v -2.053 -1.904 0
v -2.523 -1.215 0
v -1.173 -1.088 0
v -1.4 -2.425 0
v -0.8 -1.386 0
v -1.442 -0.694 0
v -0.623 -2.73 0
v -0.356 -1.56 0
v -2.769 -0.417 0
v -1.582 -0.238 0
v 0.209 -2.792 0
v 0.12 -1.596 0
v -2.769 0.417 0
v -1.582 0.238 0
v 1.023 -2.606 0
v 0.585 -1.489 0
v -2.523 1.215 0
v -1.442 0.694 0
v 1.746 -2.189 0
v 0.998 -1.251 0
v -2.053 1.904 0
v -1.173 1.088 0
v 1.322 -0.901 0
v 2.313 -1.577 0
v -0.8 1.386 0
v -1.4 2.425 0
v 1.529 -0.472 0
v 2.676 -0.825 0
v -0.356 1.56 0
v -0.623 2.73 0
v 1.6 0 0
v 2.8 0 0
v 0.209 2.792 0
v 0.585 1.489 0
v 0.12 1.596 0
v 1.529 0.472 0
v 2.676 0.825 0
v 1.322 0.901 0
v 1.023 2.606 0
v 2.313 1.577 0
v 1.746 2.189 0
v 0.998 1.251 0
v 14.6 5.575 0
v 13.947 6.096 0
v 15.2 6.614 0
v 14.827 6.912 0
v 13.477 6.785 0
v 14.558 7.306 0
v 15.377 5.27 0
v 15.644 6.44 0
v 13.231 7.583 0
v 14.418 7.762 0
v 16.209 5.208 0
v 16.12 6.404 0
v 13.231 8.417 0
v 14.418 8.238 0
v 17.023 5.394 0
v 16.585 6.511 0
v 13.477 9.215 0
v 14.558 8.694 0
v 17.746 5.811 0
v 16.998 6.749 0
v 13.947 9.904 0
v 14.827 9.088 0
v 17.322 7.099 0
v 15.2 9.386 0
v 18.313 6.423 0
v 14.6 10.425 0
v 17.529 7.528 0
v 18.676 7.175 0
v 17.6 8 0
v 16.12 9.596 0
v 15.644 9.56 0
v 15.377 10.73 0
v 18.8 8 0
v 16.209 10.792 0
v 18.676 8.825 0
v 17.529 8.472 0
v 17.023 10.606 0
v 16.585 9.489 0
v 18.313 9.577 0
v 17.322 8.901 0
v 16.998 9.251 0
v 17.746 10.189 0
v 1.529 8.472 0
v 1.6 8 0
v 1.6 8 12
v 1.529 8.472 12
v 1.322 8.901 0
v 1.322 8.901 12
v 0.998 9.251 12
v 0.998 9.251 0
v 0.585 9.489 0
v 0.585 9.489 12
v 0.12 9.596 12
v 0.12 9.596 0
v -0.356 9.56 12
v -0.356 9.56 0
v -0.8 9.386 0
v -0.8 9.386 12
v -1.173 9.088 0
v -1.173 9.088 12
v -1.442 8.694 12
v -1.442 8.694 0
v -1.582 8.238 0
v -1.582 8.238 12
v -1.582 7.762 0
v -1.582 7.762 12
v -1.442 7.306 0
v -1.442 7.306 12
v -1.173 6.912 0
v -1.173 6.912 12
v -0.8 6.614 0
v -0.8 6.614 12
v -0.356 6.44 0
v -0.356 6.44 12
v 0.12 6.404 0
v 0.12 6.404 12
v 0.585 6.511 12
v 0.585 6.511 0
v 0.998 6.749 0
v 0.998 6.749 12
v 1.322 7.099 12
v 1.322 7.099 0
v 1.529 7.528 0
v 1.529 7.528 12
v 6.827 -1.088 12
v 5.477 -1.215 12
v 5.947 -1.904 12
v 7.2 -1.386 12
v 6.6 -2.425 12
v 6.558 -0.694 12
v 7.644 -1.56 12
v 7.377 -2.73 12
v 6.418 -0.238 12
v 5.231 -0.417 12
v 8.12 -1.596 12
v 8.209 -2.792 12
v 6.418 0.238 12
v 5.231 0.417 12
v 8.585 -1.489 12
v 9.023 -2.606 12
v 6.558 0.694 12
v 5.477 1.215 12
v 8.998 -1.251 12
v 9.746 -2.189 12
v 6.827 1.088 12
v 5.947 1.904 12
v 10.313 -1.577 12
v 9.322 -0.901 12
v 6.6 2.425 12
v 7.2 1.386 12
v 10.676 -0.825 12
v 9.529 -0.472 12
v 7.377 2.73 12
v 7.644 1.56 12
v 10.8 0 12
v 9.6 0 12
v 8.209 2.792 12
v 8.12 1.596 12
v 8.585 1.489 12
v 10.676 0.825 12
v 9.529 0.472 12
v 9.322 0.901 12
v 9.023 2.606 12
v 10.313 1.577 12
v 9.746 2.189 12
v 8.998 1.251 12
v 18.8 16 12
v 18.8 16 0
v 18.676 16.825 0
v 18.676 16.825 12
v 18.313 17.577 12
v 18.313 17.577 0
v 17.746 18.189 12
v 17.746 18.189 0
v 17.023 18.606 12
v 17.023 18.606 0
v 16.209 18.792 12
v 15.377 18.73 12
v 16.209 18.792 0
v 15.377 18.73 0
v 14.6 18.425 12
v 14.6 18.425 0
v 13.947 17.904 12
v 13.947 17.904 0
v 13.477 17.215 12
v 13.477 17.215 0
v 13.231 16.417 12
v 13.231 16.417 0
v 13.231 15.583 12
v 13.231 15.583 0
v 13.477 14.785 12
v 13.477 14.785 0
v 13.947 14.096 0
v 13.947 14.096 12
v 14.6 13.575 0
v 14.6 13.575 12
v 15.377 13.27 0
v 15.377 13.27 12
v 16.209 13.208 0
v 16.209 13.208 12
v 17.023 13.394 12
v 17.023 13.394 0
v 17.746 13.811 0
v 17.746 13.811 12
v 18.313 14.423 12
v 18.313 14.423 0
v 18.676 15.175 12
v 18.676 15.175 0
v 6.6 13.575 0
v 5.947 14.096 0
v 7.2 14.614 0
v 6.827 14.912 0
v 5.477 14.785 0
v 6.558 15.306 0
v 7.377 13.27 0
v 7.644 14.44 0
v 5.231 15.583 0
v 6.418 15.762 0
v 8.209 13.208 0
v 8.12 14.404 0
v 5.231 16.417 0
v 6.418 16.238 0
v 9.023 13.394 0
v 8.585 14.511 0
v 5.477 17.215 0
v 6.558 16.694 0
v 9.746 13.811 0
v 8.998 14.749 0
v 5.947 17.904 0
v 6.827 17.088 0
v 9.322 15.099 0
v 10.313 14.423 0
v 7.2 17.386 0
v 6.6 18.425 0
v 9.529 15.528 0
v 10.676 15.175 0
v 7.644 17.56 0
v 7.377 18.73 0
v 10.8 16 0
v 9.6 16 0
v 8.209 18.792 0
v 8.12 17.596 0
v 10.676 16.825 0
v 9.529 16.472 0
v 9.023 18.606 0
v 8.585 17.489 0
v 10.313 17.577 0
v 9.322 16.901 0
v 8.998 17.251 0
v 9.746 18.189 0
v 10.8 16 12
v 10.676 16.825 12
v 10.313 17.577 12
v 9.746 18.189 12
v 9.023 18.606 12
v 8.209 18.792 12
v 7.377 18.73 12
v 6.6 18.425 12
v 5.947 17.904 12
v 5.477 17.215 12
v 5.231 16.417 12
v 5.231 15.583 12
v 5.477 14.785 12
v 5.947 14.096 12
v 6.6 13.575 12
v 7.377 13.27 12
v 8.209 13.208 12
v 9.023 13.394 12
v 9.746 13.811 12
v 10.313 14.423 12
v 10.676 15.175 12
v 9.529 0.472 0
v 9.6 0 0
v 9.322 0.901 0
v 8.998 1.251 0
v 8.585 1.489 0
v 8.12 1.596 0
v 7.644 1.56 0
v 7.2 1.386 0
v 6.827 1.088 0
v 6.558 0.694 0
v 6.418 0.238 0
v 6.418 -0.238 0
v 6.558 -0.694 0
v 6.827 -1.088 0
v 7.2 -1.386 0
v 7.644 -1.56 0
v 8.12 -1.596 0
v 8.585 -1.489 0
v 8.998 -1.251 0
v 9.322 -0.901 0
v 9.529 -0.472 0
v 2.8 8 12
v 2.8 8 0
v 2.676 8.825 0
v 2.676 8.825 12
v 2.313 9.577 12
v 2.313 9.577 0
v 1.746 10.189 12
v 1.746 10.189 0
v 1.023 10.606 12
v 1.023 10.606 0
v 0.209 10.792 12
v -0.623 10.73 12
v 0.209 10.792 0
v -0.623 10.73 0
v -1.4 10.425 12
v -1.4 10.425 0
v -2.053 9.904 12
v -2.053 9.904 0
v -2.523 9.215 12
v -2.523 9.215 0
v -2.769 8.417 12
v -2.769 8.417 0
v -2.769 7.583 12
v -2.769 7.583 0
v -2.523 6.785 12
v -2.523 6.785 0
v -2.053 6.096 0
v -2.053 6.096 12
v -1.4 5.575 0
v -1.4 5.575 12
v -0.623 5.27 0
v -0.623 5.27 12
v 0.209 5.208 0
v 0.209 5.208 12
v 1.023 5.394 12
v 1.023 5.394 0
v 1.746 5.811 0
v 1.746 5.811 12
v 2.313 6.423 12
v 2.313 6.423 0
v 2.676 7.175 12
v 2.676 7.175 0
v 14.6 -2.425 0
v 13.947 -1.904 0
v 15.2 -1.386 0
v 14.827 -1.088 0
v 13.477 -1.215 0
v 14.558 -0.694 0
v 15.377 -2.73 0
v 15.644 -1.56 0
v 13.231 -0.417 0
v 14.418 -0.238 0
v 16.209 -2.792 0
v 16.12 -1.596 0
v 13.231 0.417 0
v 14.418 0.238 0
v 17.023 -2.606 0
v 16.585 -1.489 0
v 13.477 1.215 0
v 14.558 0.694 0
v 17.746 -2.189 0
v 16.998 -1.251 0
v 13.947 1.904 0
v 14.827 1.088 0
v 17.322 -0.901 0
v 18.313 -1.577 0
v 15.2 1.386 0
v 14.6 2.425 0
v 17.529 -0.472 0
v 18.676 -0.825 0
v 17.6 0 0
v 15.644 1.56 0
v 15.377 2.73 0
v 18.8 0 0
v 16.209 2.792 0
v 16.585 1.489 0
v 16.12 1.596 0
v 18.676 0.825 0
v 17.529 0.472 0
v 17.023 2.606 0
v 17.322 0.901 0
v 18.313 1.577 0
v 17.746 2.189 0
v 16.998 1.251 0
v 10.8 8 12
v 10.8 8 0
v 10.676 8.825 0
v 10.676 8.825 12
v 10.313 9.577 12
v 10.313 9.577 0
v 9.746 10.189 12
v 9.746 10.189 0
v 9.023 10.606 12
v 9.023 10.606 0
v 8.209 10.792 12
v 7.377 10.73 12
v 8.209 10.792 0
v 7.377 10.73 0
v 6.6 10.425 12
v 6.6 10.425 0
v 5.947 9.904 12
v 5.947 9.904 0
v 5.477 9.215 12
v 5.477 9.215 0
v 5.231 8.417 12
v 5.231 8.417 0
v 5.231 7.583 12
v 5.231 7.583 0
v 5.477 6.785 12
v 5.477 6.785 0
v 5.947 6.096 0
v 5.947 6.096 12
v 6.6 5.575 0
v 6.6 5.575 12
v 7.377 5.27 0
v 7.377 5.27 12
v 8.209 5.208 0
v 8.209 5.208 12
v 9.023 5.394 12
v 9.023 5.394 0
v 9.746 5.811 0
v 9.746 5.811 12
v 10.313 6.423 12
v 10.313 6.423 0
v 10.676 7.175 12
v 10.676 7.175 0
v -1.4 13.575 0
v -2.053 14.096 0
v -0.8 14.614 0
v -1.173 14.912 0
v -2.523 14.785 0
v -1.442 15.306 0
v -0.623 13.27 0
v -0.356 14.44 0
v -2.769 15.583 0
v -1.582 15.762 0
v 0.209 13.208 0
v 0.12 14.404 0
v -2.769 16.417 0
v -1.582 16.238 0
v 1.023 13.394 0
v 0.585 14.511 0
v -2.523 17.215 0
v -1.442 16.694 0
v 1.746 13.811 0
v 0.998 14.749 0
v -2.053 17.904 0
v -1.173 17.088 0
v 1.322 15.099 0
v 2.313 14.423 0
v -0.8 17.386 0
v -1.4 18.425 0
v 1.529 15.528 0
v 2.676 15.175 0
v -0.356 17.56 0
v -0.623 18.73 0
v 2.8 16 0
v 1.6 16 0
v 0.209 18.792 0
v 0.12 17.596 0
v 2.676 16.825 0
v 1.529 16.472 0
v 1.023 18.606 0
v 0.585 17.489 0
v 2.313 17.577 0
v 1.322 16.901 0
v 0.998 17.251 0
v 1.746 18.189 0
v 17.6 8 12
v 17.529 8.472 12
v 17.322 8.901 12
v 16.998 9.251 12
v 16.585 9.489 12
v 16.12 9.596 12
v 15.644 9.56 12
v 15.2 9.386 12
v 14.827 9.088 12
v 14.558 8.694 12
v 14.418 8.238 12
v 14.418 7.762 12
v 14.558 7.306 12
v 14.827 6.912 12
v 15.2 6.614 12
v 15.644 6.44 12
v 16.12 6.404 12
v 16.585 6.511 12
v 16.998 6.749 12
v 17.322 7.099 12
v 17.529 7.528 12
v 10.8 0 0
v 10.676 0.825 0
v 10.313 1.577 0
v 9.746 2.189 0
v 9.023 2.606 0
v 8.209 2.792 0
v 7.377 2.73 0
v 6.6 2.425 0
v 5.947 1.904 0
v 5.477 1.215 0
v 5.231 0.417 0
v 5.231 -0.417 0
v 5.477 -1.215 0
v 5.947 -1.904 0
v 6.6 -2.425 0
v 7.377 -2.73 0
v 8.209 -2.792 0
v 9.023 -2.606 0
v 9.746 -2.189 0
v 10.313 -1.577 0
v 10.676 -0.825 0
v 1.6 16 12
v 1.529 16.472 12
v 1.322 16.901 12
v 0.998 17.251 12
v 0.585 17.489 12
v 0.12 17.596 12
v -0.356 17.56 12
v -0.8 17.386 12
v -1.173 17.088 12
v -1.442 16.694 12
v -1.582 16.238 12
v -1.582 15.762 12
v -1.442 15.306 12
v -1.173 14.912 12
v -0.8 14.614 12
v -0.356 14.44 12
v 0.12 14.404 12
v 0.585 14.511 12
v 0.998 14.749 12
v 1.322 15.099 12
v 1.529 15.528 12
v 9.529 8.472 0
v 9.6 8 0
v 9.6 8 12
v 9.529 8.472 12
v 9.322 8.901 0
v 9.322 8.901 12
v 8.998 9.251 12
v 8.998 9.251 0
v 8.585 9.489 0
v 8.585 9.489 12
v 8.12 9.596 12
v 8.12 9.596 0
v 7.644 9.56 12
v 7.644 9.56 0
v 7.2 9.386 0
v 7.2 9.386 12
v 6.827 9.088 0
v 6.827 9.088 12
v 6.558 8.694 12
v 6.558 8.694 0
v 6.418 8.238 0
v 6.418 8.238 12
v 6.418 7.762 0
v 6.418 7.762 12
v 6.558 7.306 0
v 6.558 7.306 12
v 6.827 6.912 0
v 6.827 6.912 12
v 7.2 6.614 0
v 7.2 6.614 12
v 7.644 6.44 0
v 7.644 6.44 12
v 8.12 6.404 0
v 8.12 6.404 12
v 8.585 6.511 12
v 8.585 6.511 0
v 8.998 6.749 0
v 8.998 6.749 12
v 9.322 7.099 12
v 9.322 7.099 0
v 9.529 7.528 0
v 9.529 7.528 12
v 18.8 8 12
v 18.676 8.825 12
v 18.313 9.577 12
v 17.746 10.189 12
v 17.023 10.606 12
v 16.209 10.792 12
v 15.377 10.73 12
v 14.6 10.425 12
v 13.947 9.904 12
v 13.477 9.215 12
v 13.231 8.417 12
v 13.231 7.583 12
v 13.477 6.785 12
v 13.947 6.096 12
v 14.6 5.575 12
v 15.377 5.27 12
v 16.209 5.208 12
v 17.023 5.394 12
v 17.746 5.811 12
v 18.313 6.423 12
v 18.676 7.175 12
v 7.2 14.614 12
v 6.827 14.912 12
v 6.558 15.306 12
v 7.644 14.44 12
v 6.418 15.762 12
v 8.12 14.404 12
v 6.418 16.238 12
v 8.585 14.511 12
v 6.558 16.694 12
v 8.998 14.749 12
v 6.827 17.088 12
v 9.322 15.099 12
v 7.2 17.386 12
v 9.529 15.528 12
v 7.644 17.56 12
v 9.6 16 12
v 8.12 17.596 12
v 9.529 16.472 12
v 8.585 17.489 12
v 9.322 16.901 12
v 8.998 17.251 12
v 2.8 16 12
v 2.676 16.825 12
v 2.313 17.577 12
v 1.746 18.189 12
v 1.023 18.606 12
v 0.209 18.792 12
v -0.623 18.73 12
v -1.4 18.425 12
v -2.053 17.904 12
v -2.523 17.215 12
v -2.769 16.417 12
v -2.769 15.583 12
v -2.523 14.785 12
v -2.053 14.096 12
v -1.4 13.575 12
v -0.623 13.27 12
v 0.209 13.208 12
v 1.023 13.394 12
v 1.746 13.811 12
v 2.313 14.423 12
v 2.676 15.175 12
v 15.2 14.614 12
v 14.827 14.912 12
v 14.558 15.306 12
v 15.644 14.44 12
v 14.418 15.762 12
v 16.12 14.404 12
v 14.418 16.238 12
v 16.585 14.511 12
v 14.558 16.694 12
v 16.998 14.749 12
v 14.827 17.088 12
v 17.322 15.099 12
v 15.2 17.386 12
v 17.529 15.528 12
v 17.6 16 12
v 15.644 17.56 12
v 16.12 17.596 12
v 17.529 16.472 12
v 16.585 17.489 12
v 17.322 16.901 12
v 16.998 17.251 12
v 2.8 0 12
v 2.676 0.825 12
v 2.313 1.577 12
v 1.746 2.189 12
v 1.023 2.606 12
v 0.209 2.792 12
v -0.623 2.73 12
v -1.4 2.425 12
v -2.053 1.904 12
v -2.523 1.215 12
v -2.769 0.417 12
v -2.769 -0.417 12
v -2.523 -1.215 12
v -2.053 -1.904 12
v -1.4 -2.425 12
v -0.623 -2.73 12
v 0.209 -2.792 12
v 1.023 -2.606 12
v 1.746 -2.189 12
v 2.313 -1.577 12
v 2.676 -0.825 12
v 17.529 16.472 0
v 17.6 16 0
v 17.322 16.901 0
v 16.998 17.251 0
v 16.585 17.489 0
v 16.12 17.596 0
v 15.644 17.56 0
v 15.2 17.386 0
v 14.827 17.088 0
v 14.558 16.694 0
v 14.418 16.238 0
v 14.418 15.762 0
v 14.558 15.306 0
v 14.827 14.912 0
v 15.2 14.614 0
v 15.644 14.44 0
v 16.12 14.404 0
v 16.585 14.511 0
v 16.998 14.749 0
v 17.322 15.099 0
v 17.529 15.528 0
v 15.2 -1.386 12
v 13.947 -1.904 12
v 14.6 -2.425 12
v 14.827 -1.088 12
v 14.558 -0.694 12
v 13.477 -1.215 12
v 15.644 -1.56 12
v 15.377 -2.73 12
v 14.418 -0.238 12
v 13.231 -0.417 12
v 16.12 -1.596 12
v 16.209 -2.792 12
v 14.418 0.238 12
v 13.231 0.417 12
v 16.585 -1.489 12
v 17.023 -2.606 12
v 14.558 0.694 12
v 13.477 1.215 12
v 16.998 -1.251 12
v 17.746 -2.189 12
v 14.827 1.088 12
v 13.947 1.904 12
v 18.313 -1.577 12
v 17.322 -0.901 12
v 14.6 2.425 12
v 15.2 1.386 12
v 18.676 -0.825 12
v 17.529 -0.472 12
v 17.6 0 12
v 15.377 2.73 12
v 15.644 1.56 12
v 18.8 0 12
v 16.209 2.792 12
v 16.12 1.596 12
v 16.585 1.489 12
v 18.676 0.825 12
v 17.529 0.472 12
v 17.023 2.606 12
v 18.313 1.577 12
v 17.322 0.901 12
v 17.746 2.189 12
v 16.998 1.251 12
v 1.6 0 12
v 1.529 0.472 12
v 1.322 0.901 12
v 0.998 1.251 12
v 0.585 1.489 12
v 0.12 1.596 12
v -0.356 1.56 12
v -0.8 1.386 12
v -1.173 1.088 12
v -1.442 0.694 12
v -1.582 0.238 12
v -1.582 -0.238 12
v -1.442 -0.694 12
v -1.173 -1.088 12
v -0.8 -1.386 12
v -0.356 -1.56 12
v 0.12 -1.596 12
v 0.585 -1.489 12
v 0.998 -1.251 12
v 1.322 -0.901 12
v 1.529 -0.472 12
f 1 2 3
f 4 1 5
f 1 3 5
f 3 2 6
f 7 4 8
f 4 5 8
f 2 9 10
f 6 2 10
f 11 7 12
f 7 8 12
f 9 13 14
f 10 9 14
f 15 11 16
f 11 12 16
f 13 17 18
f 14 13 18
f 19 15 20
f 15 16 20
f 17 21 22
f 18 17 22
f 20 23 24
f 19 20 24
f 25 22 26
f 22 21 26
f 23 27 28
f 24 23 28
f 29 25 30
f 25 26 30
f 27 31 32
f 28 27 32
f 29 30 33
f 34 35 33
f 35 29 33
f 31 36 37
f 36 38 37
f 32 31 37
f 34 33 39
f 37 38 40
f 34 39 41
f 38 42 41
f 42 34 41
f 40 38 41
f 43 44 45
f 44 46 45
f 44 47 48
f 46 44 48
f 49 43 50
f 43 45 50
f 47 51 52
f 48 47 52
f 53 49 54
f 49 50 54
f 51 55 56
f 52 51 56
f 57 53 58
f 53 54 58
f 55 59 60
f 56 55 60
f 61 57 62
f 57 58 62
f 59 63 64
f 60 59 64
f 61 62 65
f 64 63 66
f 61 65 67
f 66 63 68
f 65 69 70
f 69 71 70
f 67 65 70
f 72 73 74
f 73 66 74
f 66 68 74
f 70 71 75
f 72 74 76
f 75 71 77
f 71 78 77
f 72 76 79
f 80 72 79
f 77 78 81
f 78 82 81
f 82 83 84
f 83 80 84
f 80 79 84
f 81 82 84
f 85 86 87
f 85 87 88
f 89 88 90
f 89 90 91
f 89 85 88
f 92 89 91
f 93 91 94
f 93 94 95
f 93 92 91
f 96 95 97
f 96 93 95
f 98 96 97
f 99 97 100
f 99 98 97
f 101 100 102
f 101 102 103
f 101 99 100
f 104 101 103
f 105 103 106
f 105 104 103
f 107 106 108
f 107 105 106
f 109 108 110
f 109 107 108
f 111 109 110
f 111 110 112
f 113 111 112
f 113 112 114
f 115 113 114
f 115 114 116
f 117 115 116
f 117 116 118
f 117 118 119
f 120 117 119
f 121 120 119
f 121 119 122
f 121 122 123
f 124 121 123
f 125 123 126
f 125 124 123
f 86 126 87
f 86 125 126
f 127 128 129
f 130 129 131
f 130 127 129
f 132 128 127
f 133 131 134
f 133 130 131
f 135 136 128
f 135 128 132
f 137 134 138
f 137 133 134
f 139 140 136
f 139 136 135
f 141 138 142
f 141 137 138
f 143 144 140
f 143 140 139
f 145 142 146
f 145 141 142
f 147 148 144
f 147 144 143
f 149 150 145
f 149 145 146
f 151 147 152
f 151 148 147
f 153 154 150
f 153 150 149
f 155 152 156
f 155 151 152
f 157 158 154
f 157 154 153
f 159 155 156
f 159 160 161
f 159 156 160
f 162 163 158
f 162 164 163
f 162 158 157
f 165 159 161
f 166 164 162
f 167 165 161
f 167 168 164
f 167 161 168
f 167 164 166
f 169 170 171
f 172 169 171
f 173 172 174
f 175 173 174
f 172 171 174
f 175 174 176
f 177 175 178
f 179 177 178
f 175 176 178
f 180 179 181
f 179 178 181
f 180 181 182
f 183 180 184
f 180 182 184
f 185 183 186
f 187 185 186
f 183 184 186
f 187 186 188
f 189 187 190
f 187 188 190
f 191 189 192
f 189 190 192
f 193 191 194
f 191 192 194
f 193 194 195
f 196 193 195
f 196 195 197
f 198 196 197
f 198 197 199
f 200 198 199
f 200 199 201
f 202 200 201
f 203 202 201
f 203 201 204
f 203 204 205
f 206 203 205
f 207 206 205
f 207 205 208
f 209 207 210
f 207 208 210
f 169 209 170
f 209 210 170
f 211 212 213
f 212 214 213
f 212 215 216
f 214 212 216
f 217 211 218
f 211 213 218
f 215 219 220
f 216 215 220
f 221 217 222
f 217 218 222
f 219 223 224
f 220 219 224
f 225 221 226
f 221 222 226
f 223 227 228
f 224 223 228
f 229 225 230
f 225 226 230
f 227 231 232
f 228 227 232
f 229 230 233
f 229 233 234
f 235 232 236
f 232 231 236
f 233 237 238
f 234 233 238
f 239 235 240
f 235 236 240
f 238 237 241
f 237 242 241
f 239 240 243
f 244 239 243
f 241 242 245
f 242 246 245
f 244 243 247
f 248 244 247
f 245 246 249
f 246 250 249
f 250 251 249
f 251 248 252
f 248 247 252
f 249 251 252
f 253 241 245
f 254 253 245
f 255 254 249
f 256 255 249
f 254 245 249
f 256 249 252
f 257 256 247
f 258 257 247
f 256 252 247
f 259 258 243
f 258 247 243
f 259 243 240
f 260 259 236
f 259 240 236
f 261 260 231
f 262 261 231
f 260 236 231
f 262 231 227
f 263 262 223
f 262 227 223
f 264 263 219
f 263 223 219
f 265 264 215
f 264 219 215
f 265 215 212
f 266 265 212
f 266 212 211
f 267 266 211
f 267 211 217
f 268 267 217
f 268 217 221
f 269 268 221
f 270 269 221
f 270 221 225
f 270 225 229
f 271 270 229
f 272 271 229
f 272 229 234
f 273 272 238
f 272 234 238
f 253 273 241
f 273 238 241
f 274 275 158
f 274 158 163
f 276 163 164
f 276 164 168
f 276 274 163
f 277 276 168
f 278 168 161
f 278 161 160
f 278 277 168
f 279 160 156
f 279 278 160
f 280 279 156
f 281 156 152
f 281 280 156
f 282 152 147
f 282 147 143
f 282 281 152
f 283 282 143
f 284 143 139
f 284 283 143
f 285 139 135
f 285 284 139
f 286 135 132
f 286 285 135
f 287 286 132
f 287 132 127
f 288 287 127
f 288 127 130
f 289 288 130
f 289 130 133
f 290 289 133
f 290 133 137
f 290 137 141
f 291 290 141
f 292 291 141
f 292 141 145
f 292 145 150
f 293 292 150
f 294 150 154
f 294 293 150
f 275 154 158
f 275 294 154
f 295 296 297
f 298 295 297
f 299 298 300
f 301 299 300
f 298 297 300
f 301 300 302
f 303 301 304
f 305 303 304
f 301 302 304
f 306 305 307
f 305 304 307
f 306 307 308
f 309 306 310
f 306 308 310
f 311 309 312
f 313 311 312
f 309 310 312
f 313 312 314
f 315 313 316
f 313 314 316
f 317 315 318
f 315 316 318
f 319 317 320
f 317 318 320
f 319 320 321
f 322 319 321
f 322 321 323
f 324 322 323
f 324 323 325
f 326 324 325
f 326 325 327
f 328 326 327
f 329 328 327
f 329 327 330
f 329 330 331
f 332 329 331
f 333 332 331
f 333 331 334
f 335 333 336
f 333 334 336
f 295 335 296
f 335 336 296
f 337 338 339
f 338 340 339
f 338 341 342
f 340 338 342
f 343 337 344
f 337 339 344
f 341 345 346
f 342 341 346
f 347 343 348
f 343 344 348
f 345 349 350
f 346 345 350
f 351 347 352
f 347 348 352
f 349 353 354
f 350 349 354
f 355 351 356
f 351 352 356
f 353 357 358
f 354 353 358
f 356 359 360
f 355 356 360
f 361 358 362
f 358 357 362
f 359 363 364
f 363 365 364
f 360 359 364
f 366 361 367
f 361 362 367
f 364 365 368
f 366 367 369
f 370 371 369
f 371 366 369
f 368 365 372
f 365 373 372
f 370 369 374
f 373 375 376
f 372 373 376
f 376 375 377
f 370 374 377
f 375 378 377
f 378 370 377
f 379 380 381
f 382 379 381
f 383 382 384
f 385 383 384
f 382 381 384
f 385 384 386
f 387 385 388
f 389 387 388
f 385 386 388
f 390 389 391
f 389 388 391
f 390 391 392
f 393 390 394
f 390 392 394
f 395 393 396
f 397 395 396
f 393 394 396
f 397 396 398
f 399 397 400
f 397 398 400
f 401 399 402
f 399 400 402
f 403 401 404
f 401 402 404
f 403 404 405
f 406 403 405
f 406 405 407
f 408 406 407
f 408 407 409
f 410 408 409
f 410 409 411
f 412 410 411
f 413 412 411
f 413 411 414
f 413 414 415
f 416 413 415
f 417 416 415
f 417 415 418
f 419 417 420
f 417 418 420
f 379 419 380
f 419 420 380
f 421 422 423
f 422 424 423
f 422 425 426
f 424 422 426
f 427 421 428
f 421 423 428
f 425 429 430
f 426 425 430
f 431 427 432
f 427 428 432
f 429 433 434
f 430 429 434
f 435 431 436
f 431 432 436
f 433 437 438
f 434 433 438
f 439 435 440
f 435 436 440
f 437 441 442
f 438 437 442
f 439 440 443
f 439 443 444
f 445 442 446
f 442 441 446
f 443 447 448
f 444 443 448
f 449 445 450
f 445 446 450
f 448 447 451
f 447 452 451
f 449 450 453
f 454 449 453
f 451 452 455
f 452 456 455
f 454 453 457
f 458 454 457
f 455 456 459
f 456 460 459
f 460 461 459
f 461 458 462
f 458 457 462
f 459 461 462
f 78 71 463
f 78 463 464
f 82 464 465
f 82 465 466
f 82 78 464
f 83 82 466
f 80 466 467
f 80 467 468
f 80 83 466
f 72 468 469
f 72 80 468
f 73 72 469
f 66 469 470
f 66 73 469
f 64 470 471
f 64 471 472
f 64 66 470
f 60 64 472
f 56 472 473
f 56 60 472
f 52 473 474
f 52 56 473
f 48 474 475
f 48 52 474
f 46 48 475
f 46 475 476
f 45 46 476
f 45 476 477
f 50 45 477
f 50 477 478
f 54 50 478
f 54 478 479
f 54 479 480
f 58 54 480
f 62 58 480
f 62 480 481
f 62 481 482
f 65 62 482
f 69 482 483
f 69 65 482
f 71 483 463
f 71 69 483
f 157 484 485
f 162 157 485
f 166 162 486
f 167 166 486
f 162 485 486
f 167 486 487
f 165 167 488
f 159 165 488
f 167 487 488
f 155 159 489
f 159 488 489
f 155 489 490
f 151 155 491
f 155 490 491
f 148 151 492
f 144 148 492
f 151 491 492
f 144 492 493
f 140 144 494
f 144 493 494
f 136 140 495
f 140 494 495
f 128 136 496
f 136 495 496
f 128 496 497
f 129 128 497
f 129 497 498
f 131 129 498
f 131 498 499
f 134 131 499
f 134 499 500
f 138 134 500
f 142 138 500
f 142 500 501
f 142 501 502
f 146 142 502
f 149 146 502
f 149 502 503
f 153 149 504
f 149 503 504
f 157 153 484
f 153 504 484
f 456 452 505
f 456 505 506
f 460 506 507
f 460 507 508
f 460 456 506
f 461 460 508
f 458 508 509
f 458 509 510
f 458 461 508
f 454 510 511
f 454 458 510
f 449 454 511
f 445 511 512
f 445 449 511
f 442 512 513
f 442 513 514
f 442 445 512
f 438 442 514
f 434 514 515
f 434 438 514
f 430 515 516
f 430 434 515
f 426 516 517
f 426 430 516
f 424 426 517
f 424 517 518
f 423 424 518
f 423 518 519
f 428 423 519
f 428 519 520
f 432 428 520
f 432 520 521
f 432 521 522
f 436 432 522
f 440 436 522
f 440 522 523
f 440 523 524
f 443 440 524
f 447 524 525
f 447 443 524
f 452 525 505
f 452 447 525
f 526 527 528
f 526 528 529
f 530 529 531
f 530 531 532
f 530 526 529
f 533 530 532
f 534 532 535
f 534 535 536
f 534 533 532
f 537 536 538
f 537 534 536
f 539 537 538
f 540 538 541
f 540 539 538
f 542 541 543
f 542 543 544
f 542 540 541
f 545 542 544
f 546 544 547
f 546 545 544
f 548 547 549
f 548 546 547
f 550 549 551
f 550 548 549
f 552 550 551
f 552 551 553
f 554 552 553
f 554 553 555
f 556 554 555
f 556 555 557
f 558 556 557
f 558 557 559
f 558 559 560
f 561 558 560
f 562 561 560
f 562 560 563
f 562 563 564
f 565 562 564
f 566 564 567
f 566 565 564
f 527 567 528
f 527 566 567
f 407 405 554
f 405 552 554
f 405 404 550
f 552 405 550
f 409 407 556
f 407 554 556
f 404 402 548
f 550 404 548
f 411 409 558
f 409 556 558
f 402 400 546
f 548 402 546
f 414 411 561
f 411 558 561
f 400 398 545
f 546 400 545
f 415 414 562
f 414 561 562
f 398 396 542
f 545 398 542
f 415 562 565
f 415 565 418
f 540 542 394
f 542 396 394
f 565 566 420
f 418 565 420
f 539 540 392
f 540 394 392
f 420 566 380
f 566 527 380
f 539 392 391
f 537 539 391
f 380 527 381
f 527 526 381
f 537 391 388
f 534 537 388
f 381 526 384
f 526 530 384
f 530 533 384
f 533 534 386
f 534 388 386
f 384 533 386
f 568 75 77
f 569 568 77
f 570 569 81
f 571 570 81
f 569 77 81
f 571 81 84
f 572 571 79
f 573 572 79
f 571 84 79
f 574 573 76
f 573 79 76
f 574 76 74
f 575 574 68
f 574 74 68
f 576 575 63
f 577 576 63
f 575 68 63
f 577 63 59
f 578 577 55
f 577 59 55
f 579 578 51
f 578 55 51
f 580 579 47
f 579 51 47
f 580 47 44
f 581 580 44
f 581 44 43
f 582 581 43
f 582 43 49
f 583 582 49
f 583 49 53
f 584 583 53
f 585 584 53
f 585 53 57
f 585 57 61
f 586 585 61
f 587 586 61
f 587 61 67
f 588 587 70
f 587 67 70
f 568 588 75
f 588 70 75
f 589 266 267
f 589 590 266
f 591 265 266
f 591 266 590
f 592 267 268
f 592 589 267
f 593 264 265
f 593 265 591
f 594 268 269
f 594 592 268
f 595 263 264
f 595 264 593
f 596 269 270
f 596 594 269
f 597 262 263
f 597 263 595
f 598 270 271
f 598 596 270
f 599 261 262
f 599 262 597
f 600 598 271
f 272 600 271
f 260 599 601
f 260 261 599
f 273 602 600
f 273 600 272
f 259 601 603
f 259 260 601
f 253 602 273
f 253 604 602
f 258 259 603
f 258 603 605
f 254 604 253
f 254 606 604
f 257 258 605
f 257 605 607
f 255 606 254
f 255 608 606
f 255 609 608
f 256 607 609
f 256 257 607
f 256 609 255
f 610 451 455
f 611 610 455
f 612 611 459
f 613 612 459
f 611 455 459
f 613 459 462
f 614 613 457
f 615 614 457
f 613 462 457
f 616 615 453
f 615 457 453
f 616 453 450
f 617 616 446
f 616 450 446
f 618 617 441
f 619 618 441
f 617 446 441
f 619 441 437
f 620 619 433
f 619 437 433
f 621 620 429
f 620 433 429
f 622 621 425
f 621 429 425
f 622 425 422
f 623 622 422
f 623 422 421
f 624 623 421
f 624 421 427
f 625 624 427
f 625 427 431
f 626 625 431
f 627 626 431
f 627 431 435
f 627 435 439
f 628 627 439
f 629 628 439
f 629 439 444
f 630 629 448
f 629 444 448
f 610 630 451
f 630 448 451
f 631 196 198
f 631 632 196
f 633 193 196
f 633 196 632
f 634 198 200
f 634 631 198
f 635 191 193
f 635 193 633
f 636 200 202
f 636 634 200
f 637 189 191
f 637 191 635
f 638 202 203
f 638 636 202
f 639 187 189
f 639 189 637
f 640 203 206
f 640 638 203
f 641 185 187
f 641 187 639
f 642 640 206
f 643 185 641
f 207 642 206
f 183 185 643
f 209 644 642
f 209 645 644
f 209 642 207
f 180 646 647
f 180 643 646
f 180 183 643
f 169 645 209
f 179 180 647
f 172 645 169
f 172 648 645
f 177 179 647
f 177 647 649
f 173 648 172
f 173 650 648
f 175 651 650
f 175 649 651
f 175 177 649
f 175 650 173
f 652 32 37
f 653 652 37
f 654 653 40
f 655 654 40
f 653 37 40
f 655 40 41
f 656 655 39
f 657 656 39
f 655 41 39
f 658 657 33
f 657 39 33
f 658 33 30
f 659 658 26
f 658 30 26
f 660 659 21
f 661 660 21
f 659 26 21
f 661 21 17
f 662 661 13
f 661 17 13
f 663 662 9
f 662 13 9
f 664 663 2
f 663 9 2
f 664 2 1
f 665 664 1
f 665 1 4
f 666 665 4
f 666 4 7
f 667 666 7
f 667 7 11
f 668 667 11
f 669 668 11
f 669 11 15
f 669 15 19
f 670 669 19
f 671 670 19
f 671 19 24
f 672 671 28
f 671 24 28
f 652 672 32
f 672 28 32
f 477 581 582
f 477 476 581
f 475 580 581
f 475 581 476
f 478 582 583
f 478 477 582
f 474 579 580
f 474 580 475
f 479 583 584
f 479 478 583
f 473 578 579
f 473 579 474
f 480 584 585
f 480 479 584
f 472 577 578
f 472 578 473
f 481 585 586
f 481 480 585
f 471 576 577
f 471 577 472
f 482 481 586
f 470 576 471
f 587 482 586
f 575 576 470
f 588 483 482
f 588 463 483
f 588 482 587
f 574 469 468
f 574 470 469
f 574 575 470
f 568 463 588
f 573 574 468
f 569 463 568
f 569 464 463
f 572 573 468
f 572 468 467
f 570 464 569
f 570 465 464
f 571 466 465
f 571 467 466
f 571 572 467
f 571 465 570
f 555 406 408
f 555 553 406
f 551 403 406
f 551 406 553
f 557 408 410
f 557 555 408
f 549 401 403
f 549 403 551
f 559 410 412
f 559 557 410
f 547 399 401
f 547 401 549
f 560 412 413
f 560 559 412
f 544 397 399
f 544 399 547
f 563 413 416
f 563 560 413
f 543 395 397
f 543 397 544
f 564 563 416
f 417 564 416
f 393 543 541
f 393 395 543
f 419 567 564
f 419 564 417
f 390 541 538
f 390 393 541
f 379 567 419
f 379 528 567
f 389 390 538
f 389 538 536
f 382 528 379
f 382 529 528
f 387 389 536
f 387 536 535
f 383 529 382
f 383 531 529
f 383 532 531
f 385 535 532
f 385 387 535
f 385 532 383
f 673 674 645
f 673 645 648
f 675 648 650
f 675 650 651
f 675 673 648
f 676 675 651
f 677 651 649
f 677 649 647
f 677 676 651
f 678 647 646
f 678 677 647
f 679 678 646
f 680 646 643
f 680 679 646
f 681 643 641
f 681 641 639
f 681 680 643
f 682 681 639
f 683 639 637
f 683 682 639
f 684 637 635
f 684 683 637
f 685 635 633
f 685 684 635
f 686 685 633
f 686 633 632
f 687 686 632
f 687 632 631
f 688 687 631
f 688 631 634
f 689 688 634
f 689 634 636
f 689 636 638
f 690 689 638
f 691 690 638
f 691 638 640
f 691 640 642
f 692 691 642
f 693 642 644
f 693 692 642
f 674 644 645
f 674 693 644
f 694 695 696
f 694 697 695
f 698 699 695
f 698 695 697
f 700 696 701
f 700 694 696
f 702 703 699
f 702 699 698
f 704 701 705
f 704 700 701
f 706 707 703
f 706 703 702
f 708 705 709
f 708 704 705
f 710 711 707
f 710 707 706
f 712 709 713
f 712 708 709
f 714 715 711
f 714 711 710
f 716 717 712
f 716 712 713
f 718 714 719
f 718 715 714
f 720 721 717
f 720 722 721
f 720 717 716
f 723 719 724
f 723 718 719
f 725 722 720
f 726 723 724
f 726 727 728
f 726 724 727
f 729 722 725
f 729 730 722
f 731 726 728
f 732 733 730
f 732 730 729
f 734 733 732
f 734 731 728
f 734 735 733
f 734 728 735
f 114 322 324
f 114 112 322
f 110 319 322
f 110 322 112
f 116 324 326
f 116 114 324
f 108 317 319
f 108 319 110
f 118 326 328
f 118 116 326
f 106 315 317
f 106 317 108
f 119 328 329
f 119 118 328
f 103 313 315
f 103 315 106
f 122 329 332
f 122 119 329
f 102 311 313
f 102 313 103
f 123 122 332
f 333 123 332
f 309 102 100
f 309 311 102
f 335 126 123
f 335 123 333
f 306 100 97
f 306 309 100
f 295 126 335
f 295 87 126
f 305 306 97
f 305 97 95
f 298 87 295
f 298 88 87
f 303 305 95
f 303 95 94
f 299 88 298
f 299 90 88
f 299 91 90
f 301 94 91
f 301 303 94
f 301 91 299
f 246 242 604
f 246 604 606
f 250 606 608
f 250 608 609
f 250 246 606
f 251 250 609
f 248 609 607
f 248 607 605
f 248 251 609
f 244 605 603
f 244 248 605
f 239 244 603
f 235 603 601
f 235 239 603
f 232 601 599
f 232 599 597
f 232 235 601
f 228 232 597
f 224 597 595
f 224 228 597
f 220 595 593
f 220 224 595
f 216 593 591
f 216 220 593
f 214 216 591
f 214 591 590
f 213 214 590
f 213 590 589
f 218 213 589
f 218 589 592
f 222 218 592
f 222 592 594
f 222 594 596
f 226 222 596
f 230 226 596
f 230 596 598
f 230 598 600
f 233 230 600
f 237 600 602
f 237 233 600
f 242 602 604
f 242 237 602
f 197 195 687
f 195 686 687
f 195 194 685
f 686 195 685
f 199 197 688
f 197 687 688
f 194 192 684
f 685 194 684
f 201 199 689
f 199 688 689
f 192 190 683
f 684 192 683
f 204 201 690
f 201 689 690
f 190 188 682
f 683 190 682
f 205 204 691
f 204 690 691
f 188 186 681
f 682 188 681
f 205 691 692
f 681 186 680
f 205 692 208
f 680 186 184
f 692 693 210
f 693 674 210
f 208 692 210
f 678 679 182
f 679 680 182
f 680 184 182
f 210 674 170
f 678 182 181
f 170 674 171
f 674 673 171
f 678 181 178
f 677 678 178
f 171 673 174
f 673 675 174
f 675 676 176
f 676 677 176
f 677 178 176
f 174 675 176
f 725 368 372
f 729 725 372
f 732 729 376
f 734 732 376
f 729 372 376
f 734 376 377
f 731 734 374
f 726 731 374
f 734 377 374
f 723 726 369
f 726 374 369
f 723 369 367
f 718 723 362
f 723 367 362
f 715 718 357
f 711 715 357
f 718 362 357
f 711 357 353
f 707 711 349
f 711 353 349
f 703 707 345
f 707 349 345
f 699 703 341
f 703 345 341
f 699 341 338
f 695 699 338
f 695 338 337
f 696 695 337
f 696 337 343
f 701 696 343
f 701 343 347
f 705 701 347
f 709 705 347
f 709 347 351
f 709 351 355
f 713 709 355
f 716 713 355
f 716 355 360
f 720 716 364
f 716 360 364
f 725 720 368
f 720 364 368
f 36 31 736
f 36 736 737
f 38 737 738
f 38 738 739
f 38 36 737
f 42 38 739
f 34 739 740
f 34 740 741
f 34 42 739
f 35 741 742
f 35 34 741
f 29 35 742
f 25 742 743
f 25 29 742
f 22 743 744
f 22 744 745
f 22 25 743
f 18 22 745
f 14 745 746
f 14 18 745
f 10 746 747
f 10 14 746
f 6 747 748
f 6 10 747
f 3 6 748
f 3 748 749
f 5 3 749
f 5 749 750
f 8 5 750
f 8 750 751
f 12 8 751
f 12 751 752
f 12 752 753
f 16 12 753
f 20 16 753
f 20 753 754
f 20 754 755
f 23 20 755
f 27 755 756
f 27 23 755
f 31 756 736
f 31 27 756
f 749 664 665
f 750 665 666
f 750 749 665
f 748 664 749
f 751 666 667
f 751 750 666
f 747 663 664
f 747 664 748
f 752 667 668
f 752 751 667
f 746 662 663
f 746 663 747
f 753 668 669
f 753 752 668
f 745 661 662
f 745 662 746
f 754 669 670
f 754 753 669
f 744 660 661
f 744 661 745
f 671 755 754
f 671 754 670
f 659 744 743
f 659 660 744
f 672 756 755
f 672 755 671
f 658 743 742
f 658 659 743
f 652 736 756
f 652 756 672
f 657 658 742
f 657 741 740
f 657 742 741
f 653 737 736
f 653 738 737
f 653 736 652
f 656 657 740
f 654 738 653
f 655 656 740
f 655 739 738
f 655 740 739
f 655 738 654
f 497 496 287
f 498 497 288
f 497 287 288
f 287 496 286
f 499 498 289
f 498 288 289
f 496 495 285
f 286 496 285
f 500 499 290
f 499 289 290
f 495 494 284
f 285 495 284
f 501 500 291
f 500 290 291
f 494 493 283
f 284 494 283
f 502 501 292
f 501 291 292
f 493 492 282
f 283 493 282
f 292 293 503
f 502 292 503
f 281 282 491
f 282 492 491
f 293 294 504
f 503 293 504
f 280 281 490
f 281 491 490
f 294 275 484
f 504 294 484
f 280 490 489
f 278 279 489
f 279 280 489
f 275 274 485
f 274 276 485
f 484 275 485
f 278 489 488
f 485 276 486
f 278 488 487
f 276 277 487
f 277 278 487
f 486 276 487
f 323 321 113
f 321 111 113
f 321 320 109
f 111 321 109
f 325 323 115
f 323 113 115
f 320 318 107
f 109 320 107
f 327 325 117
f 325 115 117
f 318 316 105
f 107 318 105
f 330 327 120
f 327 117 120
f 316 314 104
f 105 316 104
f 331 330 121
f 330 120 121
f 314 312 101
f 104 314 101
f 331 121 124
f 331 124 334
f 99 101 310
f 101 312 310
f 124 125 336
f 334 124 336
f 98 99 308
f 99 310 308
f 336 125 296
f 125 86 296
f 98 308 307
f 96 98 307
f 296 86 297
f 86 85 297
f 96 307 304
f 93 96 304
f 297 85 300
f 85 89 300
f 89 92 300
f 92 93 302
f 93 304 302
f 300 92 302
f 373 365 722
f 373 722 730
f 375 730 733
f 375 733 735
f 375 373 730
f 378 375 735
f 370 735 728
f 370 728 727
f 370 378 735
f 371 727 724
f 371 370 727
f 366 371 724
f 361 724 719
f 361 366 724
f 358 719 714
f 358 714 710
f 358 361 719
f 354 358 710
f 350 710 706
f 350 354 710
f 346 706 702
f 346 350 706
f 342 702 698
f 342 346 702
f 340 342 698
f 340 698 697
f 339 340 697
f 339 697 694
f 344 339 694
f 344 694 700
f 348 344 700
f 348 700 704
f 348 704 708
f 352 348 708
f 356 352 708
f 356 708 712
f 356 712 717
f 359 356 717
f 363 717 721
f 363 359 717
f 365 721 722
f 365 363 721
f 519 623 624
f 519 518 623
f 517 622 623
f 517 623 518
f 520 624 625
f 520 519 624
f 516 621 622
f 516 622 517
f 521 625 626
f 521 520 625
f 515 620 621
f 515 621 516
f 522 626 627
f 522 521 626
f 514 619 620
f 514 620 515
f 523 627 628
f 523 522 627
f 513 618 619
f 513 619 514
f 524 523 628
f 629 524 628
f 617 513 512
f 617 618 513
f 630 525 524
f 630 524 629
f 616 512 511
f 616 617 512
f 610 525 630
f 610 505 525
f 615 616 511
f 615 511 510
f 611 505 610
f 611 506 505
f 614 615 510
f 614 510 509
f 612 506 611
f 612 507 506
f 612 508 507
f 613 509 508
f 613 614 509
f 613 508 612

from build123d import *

# Parameters (mm, degrees)
F0_R     = 2.8
F0_R_2   = 1.6
F1_DEPTH = 12


with BuildPart() as f1:
    # F0 (on Top) → F1 (new body)
    with BuildSketch(Plane.XY):
        with Locations((0, 16)):
            Circle(F0_R)
        with Locations((0, 16)):
            Circle(F0_R_2, mode=Mode.SUBTRACT)
        with Locations((8, 16)):
            Circle(F0_R)
        with Locations((8, 16)):
            Circle(F0_R_2, mode=Mode.SUBTRACT)
        with Locations((16, 16)):
            Circle(F0_R)
        with Locations((16, 16)):
            Circle(F0_R_2, mode=Mode.SUBTRACT)
        with Locations((16, 8)):
            Circle(F0_R)
        with Locations((16, 8)):
            Circle(F0_R_2, mode=Mode.SUBTRACT)
        with Locations((16, 0)):
            Circle(F0_R)
        with Locations((16, 0)):
            Circle(F0_R_2, mode=Mode.SUBTRACT)
        with Locations((8, 0)):
            Circle(F0_R)
        with Locations((8, 0)):
            Circle(F0_R_2, mode=Mode.SUBTRACT)
        with Locations((8, 8)):
            Circle(F0_R)
        with Locations((8, 8)):
            Circle(F0_R_2, mode=Mode.SUBTRACT)
        with Locations((0, 8)):
            Circle(F0_R)
        with Locations((0, 8)):
            Circle(F0_R_2, mode=Mode.SUBTRACT)
        Circle(F0_R)
        Circle(F0_R_2, mode=Mode.SUBTRACT)
    extrude(amount=F1_DEPTH)


solid = f1.part
